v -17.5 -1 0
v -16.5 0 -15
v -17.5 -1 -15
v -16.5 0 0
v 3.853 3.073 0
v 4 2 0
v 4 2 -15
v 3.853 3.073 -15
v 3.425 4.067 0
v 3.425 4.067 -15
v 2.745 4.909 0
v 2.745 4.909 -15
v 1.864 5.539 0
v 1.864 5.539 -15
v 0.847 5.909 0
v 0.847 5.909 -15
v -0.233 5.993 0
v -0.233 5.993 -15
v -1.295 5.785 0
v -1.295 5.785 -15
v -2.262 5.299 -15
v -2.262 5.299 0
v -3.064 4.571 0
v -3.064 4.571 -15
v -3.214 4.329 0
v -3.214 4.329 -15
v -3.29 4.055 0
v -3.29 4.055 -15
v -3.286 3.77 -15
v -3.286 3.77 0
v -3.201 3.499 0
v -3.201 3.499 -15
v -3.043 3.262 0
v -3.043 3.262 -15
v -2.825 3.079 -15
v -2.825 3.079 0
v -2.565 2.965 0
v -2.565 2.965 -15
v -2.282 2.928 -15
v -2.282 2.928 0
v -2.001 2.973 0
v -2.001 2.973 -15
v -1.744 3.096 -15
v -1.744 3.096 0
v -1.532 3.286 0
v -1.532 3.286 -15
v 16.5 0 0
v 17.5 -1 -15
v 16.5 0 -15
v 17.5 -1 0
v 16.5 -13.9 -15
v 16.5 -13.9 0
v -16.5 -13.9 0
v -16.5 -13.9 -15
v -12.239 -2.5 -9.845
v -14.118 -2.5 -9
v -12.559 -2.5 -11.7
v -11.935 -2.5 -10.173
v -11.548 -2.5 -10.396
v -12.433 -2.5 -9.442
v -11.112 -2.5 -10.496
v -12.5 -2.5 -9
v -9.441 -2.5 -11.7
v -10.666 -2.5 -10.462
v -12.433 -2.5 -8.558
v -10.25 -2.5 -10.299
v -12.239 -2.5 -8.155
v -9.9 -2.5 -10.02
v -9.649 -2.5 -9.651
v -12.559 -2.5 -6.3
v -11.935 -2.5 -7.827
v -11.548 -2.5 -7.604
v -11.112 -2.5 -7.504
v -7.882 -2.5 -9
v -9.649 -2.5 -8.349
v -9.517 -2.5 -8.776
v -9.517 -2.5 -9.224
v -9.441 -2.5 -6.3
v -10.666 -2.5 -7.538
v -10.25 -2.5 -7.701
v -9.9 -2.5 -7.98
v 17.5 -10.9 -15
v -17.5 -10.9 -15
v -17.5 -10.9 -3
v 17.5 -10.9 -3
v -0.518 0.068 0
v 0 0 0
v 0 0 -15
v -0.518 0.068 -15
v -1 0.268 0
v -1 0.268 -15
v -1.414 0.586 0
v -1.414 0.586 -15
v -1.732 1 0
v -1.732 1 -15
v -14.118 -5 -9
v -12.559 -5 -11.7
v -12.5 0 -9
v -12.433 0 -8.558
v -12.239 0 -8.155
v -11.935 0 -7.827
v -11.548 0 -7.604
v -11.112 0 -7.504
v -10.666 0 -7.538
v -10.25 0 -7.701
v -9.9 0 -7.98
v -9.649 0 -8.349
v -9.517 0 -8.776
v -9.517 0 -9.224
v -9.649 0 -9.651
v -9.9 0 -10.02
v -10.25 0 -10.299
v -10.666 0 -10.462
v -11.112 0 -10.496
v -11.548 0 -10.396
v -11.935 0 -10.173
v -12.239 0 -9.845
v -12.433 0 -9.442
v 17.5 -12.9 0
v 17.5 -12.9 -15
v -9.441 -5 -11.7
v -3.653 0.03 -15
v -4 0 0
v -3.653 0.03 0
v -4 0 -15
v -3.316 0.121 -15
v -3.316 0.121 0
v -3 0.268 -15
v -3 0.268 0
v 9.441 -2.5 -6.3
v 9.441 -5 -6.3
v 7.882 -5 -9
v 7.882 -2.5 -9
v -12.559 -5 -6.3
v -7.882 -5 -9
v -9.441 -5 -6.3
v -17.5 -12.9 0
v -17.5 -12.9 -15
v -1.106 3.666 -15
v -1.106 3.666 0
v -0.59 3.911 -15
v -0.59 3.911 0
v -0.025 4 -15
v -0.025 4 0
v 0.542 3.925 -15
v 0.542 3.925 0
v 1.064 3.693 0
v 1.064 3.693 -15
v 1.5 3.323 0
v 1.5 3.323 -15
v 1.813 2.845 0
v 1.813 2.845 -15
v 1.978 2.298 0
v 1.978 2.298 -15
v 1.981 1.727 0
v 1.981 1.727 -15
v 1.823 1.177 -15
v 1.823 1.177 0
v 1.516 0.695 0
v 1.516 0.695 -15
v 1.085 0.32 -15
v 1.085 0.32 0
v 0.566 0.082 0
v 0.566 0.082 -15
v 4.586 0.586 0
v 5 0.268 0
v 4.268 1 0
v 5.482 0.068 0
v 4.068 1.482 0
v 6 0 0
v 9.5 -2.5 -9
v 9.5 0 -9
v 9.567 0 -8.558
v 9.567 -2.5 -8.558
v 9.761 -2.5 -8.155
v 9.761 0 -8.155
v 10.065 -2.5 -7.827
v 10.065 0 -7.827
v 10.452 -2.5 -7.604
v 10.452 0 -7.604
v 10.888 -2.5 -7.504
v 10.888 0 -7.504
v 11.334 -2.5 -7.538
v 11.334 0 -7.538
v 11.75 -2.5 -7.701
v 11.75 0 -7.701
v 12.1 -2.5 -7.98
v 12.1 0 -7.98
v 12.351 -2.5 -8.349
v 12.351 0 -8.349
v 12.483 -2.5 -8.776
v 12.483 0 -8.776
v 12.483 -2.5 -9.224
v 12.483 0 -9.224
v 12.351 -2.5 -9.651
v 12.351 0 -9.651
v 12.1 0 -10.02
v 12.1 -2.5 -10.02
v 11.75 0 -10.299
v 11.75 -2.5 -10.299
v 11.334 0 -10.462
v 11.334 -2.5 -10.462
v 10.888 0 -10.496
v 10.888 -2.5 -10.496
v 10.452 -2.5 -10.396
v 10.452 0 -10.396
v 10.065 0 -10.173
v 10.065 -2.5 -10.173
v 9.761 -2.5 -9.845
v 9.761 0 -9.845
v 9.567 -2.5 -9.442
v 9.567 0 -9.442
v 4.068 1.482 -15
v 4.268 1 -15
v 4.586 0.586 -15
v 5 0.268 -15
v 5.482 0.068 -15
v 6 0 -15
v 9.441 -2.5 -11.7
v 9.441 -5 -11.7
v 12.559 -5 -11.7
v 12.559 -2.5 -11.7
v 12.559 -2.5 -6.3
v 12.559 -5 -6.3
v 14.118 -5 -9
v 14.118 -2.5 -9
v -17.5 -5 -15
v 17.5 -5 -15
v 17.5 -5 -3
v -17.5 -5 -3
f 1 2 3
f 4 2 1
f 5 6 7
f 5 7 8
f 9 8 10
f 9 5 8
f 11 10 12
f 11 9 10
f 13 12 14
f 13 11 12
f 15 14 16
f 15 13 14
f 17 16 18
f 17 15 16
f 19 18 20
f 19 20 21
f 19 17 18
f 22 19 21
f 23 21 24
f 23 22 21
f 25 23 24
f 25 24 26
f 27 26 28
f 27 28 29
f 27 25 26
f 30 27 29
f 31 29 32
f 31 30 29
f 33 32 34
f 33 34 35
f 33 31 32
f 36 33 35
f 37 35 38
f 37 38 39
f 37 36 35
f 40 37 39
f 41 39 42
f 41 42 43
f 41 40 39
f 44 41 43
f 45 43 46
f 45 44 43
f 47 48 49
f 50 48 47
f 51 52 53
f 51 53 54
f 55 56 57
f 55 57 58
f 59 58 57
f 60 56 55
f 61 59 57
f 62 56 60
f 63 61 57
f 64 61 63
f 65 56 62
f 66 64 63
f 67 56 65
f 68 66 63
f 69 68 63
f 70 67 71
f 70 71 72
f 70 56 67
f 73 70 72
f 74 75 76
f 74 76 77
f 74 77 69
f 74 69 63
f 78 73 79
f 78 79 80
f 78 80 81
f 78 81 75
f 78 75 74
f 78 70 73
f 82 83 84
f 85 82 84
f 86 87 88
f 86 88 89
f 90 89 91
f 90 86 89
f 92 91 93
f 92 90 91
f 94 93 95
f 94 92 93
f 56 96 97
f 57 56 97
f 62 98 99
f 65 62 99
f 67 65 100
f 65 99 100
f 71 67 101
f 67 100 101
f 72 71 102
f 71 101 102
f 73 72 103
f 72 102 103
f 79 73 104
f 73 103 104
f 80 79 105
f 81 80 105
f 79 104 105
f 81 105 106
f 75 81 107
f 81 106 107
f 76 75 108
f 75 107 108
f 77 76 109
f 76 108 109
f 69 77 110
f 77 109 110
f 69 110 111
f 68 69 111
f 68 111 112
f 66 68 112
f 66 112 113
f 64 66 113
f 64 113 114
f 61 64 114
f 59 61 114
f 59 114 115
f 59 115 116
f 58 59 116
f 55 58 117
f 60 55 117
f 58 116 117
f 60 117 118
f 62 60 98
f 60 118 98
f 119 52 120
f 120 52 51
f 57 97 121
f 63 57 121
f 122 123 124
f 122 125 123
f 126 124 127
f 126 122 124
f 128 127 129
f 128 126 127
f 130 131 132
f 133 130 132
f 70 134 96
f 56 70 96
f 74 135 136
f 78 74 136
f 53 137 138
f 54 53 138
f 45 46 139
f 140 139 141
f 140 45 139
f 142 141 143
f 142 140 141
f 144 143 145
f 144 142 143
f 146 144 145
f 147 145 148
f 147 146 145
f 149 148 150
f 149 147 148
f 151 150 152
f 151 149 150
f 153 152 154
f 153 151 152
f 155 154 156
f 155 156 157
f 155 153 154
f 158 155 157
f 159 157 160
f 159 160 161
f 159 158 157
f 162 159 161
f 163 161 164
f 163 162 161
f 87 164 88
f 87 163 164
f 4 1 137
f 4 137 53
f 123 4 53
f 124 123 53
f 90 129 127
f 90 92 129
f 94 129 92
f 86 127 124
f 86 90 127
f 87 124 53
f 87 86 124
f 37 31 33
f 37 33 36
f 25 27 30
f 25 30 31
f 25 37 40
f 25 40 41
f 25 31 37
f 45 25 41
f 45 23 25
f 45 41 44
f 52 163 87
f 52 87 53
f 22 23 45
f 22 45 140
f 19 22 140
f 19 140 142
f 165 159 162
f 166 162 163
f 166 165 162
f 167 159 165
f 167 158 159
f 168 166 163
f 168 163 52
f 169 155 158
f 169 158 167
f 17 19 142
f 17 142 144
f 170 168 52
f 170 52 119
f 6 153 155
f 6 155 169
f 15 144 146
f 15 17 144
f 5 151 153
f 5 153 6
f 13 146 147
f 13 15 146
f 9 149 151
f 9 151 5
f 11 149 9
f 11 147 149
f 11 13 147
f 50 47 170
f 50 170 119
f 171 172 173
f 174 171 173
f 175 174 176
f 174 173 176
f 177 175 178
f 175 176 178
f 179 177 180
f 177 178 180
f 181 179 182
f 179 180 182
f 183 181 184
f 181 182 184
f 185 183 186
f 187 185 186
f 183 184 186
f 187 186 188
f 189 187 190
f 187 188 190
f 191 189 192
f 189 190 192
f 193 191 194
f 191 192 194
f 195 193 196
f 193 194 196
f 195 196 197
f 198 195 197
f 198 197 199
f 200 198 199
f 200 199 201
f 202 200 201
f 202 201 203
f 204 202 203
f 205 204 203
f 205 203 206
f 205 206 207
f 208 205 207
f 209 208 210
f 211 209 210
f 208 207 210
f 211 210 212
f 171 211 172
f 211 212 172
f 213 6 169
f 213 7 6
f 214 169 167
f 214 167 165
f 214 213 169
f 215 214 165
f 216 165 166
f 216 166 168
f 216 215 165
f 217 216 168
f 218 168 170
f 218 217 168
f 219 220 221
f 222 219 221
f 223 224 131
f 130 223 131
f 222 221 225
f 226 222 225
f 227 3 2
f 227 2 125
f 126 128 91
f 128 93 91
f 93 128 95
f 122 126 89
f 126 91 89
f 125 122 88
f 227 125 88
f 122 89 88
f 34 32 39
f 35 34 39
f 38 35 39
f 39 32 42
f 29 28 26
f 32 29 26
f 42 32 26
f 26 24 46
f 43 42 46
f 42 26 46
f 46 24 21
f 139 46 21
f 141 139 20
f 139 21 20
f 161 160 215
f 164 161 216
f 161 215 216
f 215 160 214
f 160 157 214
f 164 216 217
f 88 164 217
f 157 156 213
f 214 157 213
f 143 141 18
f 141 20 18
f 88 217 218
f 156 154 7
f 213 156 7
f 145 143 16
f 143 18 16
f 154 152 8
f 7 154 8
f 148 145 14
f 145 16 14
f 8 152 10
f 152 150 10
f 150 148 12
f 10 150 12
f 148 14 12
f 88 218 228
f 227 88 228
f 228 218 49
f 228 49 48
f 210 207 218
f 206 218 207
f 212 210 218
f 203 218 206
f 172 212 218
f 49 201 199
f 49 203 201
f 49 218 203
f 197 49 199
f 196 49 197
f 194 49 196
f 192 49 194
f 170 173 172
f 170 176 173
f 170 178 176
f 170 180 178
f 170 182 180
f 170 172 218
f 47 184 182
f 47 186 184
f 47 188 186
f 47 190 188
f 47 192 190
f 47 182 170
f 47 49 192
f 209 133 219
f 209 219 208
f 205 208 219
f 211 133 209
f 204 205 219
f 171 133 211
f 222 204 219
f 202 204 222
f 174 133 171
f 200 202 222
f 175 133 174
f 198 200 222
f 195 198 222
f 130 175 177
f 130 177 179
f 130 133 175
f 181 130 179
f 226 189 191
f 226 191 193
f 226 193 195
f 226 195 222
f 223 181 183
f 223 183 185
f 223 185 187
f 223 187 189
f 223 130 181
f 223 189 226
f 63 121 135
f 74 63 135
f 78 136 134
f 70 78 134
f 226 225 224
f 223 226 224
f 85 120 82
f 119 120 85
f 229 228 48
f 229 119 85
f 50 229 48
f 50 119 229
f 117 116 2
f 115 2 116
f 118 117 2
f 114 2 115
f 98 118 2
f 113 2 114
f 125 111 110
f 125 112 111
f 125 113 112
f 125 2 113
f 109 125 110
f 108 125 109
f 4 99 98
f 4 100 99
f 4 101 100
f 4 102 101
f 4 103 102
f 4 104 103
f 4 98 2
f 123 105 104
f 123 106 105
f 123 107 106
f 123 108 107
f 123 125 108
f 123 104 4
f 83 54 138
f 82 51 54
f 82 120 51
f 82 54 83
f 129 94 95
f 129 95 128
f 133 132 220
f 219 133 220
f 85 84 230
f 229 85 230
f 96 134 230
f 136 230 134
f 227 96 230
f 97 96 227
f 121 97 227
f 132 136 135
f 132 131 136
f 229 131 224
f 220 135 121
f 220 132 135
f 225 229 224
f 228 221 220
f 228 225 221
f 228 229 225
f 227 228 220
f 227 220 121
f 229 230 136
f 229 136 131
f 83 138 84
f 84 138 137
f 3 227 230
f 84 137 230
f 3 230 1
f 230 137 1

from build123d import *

# Parameters (mm, degrees)
F1_DEPTH = 17.5
F3_DEPTH = 15
F4_R     = 2
F5_SIZE  = 1
F7_DEPTH = 2.5
F8_R     = 1.5
F9_DEPTH = 2.5


with BuildPart() as f1:
    # F0 (on Right) → F1 (new body, symmetric)
    with BuildSketch(Plane.YZ):
        Polygon((-5, -15), (0, -15), (0, 0), (-13.9, 0), (-13.9, -15), (-10.9, -15), (-10.9, -3), (-5, -3), align=None)
    extrude(amount=F1_DEPTH, both=True)

    # F2 (on face) → F3 (join)
    with BuildSketch(Plane.XY):
        with BuildLine():
            Line((0, 0), (3.4641016151, 0))
            ThreePointArc((3.4641016151, 0), (2.2943057454, 5.2766081772), (-3.0641777725, 4.5711504387))
            ThreePointArc((-3.0641777725, 4.5711504387), (-2.940920939, 3.1623183859), (-1.5320888862, 3.2855752194))
            ThreePointArc((-1.5320888862, 3.2855752194), (1.8126155741, 2.8452365235), (0, 0))
        make_face()
        with BuildLine():
            Line((-3.4641016151, 0), (0, 0))
            ThreePointArc((0, 0), (-1, 0.2679491924), (-1.7320508076, 1))
            Line((-1.7320508076, 1), (-3.4641016151, 0))
        make_face()
    extrude(amount=-F3_DEPTH)

    # F4
    f4_edges = [f1.edges().sort_by_distance(p)[0] for p in [
        (3.464102, 0, -7.5),
        (-3.464102, 0, -7.5),
    ]]
    fillet(f4_edges, radius=F4_R)

    # F5
    f5_edges = [f1.edges().sort_by_distance(p)[0] for p in [
        (-17.5, 0, -7.5),
        (17.5, 0, -7.5),
        (-17.5, -13.9, -7.5),
        (17.5, -13.9, -7.5),
    ]]
    chamfer(f5_edges, length=F5_SIZE)

    # F6 (on face) → F7 (cut)
    with BuildSketch(Plane.XZ.offset(5)):
        Polygon((-12.5588457268, -11.7), (-9.4411542732, -11.7), (-7.8823085464, -9), (-9.4411542732, -6.3), (-12.5588457268, -6.3), (-14.1176914536, -9), align=None)
        Polygon((9.4411542732, -11.7), (12.5588457268, -11.7), (14.1176914536, -9), (12.5588457268, -6.3), (9.4411542732, -6.3), (7.8823085464, -9), align=None)
    extrude(amount=-F7_DEPTH, mode=Mode.SUBTRACT)

    # F8 (on face) → F9 (cut, through all)
    with BuildSketch(Plane(origin=(0, 0, 0), x_dir=(-1, 0, 0), z_dir=(0, 1, 0))):
        with Locations((-11, -9)):
            Circle(F8_R)
        with Locations((11, -9)):
            Circle(F8_R)
    extrude(amount=-F9_DEPTH, mode=Mode.SUBTRACT)


solid = f1.part
